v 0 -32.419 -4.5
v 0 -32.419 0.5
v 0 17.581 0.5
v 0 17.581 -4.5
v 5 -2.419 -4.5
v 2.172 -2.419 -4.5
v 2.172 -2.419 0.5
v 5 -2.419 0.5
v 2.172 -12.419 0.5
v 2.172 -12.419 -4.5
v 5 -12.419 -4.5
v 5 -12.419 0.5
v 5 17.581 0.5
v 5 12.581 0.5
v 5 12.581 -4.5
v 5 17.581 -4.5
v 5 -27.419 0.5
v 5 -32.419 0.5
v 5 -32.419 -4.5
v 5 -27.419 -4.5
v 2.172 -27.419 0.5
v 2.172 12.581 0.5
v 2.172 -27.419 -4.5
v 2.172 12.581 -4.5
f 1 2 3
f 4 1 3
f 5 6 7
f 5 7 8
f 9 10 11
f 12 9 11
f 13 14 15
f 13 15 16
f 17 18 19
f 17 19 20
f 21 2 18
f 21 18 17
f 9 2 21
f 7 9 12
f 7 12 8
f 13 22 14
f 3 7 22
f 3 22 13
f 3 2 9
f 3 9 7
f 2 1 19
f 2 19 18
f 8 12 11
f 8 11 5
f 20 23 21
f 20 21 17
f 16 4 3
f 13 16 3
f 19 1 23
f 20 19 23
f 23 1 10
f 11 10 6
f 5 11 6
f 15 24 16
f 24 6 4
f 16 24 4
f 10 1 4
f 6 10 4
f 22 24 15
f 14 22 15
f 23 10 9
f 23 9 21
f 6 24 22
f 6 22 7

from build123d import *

# Parameters (mm, degrees)
F0_W     = 50
F0_H     = 5
F1_DEPTH = 5
F2_W     = 2.8276949842
F2_H     = 15
F3_DEPTH = 5.1


with BuildPart() as f1:
    # F0 (on Right) → F1 (new body)
    with BuildSketch(Plane.YZ):
        with Locations((-7.4186130613, -1.9997399262)):
            Rectangle(F0_W, F0_H)
    extrude(amount=F1_DEPTH)

    # F2 (on face) → F3 (cut)
    with BuildSketch(Plane(origin=(0, 0, -4.4997399262), x_dir=(1, 0, 0), z_dir=(0, 0, -1))):
        with Locations((3.5861525079, 19.9186130613)):
            Rectangle(F2_W, F2_H)
        with Locations((3.5861525079, -5.0813869387)):
            Rectangle(F2_W, F2_H)
    extrude(amount=-F3_DEPTH, mode=Mode.SUBTRACT)


solid = f1.part
